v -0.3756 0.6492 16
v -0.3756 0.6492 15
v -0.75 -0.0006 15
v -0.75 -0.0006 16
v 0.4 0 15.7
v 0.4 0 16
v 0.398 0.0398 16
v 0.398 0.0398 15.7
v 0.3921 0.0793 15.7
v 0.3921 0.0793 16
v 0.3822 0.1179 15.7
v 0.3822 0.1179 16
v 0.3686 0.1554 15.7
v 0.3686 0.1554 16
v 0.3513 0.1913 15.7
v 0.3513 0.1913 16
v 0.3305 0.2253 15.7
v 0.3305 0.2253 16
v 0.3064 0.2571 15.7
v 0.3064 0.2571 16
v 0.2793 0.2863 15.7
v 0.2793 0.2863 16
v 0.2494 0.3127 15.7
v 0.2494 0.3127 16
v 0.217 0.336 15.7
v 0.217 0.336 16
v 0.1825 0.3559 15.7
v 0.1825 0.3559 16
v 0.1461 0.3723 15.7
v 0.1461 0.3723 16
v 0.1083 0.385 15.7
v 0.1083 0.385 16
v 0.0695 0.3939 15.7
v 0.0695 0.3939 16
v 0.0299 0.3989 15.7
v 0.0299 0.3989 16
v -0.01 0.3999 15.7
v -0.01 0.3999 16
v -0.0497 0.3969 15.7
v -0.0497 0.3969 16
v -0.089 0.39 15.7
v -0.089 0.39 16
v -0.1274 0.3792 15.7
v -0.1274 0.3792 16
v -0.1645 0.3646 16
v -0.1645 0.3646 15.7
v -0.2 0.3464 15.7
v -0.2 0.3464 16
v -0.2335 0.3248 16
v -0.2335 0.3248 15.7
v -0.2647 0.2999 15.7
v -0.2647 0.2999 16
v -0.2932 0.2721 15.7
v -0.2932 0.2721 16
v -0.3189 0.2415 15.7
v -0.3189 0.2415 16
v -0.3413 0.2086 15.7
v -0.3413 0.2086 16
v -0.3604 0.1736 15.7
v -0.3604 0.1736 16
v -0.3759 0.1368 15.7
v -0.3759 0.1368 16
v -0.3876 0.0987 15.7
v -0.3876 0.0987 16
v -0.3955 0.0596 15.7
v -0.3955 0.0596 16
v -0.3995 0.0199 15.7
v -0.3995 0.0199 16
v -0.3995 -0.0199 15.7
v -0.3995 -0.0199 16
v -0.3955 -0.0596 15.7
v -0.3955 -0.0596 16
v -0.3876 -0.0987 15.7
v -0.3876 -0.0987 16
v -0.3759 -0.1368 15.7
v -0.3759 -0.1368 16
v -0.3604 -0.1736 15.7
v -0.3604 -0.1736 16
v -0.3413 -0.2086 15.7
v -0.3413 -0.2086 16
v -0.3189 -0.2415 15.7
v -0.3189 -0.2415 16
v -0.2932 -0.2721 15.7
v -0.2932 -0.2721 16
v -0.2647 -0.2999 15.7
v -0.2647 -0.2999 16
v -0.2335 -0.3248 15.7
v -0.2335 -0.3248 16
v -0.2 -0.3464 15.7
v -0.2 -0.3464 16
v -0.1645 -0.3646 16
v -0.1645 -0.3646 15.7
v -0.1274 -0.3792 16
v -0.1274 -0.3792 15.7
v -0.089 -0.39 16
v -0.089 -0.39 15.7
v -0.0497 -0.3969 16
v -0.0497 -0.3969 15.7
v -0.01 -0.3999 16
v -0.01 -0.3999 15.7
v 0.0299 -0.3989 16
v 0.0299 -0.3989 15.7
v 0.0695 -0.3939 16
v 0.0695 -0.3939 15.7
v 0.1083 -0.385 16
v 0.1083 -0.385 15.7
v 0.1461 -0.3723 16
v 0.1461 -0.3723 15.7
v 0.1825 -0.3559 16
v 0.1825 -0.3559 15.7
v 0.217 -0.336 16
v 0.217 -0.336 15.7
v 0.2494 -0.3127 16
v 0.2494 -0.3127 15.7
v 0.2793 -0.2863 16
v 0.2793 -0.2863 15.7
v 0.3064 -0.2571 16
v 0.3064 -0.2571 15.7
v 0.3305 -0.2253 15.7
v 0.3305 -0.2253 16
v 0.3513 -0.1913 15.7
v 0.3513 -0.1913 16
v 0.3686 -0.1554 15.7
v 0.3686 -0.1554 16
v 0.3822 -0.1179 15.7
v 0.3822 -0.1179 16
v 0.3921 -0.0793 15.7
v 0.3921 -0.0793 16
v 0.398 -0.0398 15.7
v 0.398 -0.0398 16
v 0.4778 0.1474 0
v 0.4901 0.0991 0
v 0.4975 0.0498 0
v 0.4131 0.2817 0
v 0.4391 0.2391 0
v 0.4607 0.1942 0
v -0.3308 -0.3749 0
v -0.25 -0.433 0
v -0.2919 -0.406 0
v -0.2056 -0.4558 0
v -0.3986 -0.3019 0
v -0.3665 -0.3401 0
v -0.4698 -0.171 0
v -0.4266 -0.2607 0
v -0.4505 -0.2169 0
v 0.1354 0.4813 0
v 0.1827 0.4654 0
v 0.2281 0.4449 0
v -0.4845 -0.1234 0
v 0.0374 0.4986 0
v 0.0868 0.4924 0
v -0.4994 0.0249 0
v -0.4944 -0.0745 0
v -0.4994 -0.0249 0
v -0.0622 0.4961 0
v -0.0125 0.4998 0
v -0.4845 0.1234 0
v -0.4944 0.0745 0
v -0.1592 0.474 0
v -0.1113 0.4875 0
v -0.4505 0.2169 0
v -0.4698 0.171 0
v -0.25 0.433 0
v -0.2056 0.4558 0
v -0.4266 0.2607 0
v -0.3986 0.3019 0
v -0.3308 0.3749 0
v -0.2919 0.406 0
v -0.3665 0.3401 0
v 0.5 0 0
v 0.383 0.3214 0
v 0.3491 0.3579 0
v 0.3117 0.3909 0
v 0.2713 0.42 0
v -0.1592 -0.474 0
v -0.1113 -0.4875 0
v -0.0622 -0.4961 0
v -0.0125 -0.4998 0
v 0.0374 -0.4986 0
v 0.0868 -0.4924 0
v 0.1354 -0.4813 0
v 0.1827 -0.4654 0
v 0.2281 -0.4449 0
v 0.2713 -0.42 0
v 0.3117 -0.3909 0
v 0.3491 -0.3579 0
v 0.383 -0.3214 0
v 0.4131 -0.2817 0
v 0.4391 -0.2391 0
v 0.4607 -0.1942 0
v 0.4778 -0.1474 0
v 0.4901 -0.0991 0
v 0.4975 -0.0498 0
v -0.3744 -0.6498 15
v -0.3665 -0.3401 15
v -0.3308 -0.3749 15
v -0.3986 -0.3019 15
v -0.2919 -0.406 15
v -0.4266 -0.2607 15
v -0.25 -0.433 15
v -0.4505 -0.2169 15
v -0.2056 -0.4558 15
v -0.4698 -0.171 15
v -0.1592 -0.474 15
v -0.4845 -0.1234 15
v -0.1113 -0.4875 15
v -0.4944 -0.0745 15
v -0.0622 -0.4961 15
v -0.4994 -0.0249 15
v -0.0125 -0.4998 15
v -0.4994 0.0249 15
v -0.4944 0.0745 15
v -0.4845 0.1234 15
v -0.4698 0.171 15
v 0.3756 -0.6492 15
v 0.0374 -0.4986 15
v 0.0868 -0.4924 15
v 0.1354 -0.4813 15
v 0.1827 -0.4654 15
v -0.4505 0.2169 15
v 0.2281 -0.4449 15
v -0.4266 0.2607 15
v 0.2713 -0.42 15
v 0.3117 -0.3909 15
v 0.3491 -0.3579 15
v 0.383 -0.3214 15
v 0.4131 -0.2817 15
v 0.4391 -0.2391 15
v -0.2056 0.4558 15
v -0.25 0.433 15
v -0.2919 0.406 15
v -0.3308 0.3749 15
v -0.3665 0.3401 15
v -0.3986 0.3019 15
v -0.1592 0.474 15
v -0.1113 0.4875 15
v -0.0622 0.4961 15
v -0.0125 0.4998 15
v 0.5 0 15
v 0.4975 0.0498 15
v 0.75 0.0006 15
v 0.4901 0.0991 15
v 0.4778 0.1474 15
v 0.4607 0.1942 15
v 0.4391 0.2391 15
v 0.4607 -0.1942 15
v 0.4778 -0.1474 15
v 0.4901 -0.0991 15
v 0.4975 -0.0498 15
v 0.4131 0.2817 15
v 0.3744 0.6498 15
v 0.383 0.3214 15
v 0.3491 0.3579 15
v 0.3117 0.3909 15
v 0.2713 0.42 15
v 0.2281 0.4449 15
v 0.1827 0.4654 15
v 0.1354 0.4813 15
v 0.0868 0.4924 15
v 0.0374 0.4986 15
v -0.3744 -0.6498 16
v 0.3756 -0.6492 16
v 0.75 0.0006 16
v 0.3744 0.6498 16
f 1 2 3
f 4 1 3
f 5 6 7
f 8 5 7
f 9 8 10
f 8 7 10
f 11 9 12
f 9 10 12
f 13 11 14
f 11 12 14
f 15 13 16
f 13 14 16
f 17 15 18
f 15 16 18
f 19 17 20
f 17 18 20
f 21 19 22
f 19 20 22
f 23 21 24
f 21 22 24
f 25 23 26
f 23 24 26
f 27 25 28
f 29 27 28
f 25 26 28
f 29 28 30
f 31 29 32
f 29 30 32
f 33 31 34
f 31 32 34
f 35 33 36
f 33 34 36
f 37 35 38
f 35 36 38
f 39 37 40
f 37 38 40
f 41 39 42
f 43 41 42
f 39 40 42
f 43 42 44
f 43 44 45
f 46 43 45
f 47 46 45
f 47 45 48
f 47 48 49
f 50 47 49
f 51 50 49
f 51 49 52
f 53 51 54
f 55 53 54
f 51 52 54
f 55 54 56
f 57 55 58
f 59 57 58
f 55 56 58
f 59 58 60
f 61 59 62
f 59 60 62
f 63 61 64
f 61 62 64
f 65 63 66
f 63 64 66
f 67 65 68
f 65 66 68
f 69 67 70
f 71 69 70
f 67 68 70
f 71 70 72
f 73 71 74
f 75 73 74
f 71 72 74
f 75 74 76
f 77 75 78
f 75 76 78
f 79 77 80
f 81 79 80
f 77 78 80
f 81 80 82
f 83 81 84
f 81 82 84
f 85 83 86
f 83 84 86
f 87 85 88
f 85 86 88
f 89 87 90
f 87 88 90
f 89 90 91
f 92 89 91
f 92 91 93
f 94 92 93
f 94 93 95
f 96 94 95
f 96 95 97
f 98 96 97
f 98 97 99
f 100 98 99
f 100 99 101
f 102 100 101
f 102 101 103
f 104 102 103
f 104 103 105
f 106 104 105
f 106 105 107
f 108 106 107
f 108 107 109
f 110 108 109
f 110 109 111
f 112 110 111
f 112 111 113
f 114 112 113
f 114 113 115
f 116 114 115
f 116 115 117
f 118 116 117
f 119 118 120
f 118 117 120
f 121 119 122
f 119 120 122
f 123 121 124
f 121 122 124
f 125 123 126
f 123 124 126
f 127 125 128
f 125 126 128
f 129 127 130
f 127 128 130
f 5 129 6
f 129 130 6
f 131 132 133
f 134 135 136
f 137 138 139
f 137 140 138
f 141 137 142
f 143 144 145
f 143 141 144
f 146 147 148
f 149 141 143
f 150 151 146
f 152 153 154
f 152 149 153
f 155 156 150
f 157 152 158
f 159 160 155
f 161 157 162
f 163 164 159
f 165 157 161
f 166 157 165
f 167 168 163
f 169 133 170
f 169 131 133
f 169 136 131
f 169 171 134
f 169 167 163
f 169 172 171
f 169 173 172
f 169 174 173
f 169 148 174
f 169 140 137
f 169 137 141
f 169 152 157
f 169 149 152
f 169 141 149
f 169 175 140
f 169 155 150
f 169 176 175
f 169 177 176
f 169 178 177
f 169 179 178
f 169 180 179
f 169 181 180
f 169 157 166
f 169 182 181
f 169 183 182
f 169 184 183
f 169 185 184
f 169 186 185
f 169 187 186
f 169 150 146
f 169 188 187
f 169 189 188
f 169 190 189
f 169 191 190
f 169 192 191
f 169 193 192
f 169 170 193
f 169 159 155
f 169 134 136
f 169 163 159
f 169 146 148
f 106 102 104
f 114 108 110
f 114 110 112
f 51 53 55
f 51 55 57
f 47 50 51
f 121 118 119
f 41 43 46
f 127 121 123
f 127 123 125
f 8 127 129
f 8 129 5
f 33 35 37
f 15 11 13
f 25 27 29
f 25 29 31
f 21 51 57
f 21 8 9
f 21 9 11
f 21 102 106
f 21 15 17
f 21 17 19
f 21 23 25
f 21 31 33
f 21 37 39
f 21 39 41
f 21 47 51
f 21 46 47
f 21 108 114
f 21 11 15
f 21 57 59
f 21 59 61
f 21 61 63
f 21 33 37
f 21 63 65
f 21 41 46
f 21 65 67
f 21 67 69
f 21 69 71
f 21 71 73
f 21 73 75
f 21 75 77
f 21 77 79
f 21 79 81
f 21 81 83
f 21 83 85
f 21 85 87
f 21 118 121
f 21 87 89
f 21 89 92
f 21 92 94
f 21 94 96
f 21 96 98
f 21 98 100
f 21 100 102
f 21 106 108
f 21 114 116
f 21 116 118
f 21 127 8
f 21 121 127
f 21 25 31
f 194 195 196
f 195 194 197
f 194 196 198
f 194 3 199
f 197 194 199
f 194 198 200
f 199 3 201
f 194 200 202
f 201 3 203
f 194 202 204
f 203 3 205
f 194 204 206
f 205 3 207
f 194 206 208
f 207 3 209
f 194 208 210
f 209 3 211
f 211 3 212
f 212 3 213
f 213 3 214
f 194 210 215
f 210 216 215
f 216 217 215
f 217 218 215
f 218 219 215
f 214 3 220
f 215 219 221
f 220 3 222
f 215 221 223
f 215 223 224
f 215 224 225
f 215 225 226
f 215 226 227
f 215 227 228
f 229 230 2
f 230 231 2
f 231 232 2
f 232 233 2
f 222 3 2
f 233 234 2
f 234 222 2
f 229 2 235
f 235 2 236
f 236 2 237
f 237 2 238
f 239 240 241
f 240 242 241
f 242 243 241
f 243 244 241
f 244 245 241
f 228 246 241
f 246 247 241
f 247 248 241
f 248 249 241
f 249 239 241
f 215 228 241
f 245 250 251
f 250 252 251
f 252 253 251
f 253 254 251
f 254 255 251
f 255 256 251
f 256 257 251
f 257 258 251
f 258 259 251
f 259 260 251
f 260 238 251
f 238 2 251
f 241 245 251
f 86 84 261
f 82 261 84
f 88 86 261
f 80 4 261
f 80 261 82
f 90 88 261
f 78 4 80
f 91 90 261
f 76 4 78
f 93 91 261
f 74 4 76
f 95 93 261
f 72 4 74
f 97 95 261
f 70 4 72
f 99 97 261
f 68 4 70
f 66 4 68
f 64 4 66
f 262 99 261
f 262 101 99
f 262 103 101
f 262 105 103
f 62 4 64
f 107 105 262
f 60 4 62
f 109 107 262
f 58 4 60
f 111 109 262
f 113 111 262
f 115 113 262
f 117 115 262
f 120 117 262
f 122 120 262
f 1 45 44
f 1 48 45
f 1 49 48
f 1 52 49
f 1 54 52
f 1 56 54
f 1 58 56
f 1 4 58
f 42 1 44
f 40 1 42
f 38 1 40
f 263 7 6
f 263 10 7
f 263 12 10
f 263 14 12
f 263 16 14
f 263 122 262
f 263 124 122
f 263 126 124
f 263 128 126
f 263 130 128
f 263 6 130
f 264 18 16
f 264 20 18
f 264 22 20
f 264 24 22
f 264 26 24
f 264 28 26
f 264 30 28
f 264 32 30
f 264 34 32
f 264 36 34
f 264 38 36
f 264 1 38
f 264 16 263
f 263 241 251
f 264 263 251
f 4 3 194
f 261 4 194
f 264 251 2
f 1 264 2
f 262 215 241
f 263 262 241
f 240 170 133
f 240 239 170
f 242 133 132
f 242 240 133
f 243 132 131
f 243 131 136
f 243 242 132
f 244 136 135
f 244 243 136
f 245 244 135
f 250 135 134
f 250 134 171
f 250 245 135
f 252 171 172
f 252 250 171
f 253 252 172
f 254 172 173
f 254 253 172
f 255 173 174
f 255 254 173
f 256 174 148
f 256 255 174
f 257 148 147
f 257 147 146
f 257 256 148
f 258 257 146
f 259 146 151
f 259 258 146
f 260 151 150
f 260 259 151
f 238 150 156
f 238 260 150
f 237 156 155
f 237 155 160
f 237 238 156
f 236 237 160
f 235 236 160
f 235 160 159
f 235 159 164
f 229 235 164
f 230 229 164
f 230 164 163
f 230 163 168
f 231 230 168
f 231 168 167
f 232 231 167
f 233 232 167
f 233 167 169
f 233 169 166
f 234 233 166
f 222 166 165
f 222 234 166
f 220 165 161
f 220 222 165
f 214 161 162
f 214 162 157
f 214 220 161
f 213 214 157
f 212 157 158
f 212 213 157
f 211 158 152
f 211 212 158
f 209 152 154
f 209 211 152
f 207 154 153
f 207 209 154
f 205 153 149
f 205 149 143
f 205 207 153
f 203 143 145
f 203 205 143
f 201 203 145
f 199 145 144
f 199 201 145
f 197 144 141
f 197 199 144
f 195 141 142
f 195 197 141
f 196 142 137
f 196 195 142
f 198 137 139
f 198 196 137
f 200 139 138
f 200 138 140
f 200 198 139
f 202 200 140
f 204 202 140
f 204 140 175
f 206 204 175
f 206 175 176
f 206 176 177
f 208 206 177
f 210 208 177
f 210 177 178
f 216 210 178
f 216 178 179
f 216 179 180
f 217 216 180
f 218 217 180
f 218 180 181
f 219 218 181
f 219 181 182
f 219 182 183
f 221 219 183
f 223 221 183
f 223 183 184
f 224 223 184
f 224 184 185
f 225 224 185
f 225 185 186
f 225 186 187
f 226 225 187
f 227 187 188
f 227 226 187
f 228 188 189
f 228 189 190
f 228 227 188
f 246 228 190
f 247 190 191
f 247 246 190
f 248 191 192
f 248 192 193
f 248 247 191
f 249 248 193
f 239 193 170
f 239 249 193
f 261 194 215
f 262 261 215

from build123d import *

# Parameters (mm, degrees)
F0_W     = 0.5
F0_H     = 15
F2_R     = 0.5
F3_DEPTH = 1
F4_R     = 0.4
F5_DEPTH = 0.3


with BuildPart() as f1:
    # F0 (on Front) → F1 (revolve)
    with BuildSketch(Plane.XZ):
        with Locations((0.25, 7.5)):
            Rectangle(F0_W, F0_H)
    revolve(axis=Axis((0, 0, 7.5), (0, 0, 1)))

    # F2 (on face) → F3 (join)
    with BuildSketch(Plane.XY.offset(15)):
        Polygon((0.75, 0.0006401425), (0.3744456203, 0.6498391241), (-0.3755543797, 0.6491989816), (-0.75, -0.0006401425), (-0.3744456203, -0.6498391241), (0.3755543797, -0.6491989816), align=None)
        Circle(F2_R, mode=Mode.SUBTRACT)
        Circle(F2_R)
    extrude(amount=F3_DEPTH)

    # F4 (on face) → F5 (cut)
    with BuildSketch(Plane.XY.offset(16)):
        Circle(F4_R)
    extrude(amount=-F5_DEPTH, mode=Mode.SUBTRACT)


solid = f1.part
